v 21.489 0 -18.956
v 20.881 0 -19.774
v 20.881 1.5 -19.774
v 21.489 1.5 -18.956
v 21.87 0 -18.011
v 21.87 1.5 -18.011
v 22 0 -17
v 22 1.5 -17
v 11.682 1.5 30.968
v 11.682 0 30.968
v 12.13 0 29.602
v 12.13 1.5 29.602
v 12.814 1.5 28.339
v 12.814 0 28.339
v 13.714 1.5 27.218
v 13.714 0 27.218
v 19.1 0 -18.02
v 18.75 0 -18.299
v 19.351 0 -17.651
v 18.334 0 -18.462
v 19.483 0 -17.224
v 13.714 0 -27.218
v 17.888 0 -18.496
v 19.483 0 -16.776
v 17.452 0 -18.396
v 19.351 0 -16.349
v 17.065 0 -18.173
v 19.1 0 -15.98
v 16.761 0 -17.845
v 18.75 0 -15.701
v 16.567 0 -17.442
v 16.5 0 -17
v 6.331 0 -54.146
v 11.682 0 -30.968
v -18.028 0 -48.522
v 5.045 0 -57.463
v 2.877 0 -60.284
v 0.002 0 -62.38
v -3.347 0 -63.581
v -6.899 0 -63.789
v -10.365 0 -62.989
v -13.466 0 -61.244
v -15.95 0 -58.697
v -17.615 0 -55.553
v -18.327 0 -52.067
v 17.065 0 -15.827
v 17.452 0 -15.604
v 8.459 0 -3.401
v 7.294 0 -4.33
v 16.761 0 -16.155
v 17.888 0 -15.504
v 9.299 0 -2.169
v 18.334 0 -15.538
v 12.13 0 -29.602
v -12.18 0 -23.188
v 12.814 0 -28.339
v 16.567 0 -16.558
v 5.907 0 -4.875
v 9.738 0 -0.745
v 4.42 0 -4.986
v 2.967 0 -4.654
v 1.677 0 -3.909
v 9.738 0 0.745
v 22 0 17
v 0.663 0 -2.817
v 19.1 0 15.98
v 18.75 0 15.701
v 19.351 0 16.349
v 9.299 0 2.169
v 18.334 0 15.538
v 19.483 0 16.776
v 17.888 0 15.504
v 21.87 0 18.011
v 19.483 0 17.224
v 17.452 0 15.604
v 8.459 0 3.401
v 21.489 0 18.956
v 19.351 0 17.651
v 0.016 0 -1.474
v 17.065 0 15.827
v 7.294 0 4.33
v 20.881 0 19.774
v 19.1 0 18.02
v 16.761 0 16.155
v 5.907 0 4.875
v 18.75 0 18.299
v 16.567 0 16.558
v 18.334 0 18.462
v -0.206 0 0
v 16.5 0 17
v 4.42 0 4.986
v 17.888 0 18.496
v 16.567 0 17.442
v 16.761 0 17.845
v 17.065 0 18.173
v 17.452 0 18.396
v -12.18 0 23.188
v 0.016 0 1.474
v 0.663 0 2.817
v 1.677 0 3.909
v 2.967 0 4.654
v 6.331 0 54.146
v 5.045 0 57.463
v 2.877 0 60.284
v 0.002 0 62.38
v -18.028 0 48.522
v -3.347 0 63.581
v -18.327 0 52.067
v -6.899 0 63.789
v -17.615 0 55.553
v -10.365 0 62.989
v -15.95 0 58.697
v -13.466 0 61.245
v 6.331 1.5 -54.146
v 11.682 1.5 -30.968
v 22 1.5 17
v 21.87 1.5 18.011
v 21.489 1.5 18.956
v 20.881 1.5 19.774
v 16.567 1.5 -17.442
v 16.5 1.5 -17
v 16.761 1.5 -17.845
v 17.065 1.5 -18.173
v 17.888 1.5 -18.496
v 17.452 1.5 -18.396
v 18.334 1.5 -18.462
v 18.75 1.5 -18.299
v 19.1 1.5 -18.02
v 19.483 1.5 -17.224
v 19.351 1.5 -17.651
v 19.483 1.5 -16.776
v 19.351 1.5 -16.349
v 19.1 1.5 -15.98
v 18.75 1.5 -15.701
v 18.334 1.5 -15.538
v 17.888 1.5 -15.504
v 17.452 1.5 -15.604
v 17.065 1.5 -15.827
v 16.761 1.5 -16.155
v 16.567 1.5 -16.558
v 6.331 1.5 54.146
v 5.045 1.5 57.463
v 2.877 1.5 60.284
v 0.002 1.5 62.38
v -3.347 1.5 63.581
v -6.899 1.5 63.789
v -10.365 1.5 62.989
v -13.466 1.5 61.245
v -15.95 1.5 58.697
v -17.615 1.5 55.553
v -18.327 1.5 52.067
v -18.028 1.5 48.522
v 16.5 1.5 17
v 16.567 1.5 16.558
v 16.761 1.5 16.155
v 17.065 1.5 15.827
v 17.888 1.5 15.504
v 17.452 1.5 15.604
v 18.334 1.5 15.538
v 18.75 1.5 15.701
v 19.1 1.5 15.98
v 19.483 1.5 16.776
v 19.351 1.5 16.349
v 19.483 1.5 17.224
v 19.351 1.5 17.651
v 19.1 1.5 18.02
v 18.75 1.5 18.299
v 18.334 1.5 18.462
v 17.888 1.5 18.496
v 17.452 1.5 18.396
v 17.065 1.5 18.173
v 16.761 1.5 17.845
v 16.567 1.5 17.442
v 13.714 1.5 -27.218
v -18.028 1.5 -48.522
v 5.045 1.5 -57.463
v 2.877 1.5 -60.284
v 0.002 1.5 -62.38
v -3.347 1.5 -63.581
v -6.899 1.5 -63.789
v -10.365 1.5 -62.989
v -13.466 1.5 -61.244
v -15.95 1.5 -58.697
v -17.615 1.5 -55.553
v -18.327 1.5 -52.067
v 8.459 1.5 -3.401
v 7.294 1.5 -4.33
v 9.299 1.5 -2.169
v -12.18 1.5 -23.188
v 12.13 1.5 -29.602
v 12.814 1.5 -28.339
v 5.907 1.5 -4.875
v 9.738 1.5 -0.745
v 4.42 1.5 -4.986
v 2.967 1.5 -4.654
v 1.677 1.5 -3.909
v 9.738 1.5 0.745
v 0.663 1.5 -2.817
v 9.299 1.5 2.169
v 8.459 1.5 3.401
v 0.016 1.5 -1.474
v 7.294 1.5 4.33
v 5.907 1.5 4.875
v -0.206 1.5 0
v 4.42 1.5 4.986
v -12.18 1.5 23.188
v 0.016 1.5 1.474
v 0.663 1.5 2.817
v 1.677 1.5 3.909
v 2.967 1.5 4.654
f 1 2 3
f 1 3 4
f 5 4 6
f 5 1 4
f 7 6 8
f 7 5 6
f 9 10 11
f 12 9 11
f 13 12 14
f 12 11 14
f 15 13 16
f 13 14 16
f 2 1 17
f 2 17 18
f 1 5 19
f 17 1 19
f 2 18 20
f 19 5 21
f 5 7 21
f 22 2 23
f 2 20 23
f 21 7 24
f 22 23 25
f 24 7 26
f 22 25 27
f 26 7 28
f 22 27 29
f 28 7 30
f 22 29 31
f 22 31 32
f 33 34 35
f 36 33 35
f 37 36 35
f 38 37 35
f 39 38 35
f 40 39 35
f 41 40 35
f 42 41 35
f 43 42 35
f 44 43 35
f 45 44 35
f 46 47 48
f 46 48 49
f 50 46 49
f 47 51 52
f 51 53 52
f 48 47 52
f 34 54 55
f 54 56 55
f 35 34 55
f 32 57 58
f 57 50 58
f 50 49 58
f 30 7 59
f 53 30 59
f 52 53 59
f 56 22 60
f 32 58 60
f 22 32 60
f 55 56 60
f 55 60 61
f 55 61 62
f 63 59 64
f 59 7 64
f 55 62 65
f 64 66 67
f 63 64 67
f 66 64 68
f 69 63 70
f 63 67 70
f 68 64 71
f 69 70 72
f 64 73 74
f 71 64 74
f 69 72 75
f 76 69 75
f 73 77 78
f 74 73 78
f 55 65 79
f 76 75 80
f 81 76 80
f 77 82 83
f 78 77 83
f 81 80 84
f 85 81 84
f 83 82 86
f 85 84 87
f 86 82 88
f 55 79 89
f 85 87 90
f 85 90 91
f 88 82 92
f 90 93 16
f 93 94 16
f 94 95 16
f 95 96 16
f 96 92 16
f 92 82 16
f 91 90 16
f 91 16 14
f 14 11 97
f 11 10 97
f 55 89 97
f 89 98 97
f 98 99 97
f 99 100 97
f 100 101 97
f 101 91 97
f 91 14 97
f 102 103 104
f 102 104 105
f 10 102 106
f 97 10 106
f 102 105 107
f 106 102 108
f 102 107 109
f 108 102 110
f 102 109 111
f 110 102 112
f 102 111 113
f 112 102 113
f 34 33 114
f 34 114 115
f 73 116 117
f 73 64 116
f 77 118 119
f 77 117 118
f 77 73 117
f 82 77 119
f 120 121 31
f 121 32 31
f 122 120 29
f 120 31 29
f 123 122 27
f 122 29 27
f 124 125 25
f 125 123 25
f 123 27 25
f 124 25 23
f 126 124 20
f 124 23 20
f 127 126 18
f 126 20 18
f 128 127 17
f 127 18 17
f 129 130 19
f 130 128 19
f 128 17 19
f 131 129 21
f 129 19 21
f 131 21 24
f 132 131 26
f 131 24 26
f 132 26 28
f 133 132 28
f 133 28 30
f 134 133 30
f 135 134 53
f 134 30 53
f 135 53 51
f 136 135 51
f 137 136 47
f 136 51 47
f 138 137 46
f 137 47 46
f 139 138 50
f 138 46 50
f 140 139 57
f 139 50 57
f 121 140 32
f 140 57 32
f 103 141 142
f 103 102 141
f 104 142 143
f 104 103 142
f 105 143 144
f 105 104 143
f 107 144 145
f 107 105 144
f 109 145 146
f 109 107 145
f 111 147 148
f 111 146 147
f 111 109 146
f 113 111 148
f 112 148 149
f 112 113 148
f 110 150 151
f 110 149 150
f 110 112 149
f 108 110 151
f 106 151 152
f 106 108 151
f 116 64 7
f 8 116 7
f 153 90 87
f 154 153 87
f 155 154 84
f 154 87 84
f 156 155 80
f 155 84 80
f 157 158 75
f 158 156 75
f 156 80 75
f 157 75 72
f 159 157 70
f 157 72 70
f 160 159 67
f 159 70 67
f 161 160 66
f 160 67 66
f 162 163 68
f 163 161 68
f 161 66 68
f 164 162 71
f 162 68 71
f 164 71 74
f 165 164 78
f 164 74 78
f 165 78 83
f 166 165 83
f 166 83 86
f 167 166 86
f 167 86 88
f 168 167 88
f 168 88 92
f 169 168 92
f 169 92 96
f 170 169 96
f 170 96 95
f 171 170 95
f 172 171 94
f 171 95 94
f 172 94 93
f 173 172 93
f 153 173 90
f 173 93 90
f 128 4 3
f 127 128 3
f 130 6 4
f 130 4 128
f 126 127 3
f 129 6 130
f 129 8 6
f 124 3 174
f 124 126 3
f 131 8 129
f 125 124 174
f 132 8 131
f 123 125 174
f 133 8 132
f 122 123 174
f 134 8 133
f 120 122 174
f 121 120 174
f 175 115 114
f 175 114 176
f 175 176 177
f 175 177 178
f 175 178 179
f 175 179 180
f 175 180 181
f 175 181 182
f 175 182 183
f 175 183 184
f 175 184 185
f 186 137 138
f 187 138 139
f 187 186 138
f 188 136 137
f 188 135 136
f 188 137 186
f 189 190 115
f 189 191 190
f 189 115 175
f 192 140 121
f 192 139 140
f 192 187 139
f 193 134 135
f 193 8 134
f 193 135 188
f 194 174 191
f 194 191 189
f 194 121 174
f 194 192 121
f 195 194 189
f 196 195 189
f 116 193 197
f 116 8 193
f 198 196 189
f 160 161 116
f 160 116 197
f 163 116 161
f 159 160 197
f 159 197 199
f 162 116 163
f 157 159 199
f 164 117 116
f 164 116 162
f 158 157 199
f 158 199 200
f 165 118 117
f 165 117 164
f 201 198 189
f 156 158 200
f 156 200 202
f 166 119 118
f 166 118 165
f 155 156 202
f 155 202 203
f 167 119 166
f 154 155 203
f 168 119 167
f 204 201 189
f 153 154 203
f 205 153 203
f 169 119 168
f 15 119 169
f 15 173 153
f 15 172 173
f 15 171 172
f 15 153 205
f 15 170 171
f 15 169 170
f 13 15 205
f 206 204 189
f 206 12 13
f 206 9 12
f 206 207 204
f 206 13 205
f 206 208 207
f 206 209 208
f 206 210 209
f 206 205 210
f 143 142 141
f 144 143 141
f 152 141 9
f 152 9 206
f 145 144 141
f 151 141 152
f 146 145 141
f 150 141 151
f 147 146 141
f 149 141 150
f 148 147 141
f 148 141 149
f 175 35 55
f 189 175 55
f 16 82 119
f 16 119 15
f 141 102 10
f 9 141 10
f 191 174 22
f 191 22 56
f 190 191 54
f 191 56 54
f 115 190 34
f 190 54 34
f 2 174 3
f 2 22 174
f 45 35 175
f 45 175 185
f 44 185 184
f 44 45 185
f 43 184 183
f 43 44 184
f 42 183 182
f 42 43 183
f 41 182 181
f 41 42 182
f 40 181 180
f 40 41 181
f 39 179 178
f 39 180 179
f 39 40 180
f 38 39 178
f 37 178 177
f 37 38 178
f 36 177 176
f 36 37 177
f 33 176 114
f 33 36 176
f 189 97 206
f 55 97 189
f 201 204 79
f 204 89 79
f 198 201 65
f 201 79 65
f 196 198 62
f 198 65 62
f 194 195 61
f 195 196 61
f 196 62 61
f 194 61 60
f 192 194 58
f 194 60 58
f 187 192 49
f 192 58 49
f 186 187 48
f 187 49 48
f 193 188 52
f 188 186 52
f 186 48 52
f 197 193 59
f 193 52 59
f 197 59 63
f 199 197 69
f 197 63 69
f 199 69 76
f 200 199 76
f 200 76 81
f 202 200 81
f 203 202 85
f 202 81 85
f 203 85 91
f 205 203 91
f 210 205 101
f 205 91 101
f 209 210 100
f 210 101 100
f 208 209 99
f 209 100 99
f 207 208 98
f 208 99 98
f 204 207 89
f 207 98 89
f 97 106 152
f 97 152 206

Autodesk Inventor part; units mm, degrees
ref_plane "YZ Plane" through (0, 0, 0) normal (1, 0, 0) x (0, 1, 0)
ref_plane "XZ Plane" through (0, 0, 0) normal (0, 1, 0) x (-1, 0, 0)
ref_plane "XY Plane" through (0, 0, 0) normal (0, 0, 1) x (1, 0, 0)
sketch "Эскиз2" plane through (0, 0, 0) normal (0, 1, 0) x (-1, 0, 0)
  line L0 (0, 26) -> (0, -26) construction
  arc A0 (-12.5, 26) -> (-12.1796, 28.8119) centre (0, 26) ccw construction
  line L1 (0, 26) -> (5.8487, 51.3336) construction
  arc A1 (18.0284, 48.5217) -> (-6.3309, 54.1455) centre (5.8487, 51.3336) ccw
  line L2 (0, 0) -> (59.5469, 0) construction
  line L3 (18.0284, 48.5217) -> (12.1796, 23.1881)
  line L4 (-6.3309, 54.1455) -> (-11.682, 30.9675)
  arc A2 (3.0368, 39.154) -> (18.0284, 48.5217) centre (5.8487, 51.3336) ccw construction
  arc A3 (-6.3309, 54.1455) -> (3.0368, 39.154) centre (5.8487, 51.3336) ccw construction
  arc A4 (-12.1796, -28.8119) -> (-12.5, -26) centre (0, -26) ccw construction
  arc A5 (-6.3309, -54.1455) -> (18.0284, -48.5217) centre (5.8487, -51.3336) ccw
  line L5 (18.0284, -48.5217) -> (12.1796, -23.1881)
  line L6 (-6.3309, -54.1455) -> (-11.682, -30.9675)
  arc A6 (18.0284, -48.5217) -> (3.0368, -39.154) centre (5.8487, -51.3336) ccw construction
  arc A7 (3.0368, -39.154) -> (-6.3309, -54.1455) centre (5.8487, -51.3336) ccw construction
  line L7 (12.1796, 23.1881) -> (12.1796, -23.1881)
  arc A8 (-12.1796, 28.8119) -> (-12.5, 26) centre (0, 26) ccw construction
  arc A9 (-12.5, -26) -> (-12.1796, -28.8119) centre (0, -26) ccw construction
  line L8 (-18, 17) -> (-18, -17) construction
  circle A10 centre (-18, 17) radius 1.5
  circle A11 centre (-18, -17) radius 1.5
  arc A12 (-20.8814, 19.7744) -> (-22, 17) centre (-18, 17) ccw
  arc A13 (-18, -13) -> (-22, -17) centre (-18, -17) ccw construction
  line L9 (-22, 17) -> (-22, -17)
  line L10 (-20.8814, 19.7744) -> (-13.7141, 27.2183)
  arc A14 (-13.7141, 27.2183) -> (-11.682, 30.9675) centre (-19.4769, 32.7671) ccw
  arc A15 (-18, 13) -> (-20.8814, 19.7744) centre (-18, 17) ccw construction
  arc A16 (-22, 17) -> (-18, 13) centre (-18, 17) ccw construction
  arc A17 (-22, -17) -> (-20.8814, -19.7744) centre (-18, -17) ccw
  line L11 (-13.7141, -27.2183) -> (-20.8814, -19.7744)
  arc A18 (-11.682, -30.9675) -> (-13.7141, -27.2183) centre (-19.4769, -32.7671) ccw
  arc A19 (-20.8814, -19.7744) -> (-18, -13) centre (-18, -17) ccw construction
  circle A20 centre (-4.794, 0) radius 5
  point P0 (-18, 0)
  point P1 (0, 0)
  dimension "d14" = 52
  dimension "d15" = 26
  dimension "d16" = 25
  dimension "d17" = 26
  dimension "d18" = 167
  dimension "d19" = 25
  dimension "d20" = 34
  dimension "d21" = 18
  dimension "d22" = 3
  dimension "d23" = 3
  dimension "d24" = 8
  dimension "d25" = 8
  dimension "d26" = 8
  dimension "d27" = 8
  dimension "d28" = 10
  dimension "d29" = 4.794
  dimension "d32" = 26
  dimension "d33" = 51.3336
  dimension "d34" = 4.794
  dimension "d35" = 10.6427
extrude "Выдавливание2" add sketch "Эскиз2" along normal blind 1.5
properties part number "Capasitor_board"
